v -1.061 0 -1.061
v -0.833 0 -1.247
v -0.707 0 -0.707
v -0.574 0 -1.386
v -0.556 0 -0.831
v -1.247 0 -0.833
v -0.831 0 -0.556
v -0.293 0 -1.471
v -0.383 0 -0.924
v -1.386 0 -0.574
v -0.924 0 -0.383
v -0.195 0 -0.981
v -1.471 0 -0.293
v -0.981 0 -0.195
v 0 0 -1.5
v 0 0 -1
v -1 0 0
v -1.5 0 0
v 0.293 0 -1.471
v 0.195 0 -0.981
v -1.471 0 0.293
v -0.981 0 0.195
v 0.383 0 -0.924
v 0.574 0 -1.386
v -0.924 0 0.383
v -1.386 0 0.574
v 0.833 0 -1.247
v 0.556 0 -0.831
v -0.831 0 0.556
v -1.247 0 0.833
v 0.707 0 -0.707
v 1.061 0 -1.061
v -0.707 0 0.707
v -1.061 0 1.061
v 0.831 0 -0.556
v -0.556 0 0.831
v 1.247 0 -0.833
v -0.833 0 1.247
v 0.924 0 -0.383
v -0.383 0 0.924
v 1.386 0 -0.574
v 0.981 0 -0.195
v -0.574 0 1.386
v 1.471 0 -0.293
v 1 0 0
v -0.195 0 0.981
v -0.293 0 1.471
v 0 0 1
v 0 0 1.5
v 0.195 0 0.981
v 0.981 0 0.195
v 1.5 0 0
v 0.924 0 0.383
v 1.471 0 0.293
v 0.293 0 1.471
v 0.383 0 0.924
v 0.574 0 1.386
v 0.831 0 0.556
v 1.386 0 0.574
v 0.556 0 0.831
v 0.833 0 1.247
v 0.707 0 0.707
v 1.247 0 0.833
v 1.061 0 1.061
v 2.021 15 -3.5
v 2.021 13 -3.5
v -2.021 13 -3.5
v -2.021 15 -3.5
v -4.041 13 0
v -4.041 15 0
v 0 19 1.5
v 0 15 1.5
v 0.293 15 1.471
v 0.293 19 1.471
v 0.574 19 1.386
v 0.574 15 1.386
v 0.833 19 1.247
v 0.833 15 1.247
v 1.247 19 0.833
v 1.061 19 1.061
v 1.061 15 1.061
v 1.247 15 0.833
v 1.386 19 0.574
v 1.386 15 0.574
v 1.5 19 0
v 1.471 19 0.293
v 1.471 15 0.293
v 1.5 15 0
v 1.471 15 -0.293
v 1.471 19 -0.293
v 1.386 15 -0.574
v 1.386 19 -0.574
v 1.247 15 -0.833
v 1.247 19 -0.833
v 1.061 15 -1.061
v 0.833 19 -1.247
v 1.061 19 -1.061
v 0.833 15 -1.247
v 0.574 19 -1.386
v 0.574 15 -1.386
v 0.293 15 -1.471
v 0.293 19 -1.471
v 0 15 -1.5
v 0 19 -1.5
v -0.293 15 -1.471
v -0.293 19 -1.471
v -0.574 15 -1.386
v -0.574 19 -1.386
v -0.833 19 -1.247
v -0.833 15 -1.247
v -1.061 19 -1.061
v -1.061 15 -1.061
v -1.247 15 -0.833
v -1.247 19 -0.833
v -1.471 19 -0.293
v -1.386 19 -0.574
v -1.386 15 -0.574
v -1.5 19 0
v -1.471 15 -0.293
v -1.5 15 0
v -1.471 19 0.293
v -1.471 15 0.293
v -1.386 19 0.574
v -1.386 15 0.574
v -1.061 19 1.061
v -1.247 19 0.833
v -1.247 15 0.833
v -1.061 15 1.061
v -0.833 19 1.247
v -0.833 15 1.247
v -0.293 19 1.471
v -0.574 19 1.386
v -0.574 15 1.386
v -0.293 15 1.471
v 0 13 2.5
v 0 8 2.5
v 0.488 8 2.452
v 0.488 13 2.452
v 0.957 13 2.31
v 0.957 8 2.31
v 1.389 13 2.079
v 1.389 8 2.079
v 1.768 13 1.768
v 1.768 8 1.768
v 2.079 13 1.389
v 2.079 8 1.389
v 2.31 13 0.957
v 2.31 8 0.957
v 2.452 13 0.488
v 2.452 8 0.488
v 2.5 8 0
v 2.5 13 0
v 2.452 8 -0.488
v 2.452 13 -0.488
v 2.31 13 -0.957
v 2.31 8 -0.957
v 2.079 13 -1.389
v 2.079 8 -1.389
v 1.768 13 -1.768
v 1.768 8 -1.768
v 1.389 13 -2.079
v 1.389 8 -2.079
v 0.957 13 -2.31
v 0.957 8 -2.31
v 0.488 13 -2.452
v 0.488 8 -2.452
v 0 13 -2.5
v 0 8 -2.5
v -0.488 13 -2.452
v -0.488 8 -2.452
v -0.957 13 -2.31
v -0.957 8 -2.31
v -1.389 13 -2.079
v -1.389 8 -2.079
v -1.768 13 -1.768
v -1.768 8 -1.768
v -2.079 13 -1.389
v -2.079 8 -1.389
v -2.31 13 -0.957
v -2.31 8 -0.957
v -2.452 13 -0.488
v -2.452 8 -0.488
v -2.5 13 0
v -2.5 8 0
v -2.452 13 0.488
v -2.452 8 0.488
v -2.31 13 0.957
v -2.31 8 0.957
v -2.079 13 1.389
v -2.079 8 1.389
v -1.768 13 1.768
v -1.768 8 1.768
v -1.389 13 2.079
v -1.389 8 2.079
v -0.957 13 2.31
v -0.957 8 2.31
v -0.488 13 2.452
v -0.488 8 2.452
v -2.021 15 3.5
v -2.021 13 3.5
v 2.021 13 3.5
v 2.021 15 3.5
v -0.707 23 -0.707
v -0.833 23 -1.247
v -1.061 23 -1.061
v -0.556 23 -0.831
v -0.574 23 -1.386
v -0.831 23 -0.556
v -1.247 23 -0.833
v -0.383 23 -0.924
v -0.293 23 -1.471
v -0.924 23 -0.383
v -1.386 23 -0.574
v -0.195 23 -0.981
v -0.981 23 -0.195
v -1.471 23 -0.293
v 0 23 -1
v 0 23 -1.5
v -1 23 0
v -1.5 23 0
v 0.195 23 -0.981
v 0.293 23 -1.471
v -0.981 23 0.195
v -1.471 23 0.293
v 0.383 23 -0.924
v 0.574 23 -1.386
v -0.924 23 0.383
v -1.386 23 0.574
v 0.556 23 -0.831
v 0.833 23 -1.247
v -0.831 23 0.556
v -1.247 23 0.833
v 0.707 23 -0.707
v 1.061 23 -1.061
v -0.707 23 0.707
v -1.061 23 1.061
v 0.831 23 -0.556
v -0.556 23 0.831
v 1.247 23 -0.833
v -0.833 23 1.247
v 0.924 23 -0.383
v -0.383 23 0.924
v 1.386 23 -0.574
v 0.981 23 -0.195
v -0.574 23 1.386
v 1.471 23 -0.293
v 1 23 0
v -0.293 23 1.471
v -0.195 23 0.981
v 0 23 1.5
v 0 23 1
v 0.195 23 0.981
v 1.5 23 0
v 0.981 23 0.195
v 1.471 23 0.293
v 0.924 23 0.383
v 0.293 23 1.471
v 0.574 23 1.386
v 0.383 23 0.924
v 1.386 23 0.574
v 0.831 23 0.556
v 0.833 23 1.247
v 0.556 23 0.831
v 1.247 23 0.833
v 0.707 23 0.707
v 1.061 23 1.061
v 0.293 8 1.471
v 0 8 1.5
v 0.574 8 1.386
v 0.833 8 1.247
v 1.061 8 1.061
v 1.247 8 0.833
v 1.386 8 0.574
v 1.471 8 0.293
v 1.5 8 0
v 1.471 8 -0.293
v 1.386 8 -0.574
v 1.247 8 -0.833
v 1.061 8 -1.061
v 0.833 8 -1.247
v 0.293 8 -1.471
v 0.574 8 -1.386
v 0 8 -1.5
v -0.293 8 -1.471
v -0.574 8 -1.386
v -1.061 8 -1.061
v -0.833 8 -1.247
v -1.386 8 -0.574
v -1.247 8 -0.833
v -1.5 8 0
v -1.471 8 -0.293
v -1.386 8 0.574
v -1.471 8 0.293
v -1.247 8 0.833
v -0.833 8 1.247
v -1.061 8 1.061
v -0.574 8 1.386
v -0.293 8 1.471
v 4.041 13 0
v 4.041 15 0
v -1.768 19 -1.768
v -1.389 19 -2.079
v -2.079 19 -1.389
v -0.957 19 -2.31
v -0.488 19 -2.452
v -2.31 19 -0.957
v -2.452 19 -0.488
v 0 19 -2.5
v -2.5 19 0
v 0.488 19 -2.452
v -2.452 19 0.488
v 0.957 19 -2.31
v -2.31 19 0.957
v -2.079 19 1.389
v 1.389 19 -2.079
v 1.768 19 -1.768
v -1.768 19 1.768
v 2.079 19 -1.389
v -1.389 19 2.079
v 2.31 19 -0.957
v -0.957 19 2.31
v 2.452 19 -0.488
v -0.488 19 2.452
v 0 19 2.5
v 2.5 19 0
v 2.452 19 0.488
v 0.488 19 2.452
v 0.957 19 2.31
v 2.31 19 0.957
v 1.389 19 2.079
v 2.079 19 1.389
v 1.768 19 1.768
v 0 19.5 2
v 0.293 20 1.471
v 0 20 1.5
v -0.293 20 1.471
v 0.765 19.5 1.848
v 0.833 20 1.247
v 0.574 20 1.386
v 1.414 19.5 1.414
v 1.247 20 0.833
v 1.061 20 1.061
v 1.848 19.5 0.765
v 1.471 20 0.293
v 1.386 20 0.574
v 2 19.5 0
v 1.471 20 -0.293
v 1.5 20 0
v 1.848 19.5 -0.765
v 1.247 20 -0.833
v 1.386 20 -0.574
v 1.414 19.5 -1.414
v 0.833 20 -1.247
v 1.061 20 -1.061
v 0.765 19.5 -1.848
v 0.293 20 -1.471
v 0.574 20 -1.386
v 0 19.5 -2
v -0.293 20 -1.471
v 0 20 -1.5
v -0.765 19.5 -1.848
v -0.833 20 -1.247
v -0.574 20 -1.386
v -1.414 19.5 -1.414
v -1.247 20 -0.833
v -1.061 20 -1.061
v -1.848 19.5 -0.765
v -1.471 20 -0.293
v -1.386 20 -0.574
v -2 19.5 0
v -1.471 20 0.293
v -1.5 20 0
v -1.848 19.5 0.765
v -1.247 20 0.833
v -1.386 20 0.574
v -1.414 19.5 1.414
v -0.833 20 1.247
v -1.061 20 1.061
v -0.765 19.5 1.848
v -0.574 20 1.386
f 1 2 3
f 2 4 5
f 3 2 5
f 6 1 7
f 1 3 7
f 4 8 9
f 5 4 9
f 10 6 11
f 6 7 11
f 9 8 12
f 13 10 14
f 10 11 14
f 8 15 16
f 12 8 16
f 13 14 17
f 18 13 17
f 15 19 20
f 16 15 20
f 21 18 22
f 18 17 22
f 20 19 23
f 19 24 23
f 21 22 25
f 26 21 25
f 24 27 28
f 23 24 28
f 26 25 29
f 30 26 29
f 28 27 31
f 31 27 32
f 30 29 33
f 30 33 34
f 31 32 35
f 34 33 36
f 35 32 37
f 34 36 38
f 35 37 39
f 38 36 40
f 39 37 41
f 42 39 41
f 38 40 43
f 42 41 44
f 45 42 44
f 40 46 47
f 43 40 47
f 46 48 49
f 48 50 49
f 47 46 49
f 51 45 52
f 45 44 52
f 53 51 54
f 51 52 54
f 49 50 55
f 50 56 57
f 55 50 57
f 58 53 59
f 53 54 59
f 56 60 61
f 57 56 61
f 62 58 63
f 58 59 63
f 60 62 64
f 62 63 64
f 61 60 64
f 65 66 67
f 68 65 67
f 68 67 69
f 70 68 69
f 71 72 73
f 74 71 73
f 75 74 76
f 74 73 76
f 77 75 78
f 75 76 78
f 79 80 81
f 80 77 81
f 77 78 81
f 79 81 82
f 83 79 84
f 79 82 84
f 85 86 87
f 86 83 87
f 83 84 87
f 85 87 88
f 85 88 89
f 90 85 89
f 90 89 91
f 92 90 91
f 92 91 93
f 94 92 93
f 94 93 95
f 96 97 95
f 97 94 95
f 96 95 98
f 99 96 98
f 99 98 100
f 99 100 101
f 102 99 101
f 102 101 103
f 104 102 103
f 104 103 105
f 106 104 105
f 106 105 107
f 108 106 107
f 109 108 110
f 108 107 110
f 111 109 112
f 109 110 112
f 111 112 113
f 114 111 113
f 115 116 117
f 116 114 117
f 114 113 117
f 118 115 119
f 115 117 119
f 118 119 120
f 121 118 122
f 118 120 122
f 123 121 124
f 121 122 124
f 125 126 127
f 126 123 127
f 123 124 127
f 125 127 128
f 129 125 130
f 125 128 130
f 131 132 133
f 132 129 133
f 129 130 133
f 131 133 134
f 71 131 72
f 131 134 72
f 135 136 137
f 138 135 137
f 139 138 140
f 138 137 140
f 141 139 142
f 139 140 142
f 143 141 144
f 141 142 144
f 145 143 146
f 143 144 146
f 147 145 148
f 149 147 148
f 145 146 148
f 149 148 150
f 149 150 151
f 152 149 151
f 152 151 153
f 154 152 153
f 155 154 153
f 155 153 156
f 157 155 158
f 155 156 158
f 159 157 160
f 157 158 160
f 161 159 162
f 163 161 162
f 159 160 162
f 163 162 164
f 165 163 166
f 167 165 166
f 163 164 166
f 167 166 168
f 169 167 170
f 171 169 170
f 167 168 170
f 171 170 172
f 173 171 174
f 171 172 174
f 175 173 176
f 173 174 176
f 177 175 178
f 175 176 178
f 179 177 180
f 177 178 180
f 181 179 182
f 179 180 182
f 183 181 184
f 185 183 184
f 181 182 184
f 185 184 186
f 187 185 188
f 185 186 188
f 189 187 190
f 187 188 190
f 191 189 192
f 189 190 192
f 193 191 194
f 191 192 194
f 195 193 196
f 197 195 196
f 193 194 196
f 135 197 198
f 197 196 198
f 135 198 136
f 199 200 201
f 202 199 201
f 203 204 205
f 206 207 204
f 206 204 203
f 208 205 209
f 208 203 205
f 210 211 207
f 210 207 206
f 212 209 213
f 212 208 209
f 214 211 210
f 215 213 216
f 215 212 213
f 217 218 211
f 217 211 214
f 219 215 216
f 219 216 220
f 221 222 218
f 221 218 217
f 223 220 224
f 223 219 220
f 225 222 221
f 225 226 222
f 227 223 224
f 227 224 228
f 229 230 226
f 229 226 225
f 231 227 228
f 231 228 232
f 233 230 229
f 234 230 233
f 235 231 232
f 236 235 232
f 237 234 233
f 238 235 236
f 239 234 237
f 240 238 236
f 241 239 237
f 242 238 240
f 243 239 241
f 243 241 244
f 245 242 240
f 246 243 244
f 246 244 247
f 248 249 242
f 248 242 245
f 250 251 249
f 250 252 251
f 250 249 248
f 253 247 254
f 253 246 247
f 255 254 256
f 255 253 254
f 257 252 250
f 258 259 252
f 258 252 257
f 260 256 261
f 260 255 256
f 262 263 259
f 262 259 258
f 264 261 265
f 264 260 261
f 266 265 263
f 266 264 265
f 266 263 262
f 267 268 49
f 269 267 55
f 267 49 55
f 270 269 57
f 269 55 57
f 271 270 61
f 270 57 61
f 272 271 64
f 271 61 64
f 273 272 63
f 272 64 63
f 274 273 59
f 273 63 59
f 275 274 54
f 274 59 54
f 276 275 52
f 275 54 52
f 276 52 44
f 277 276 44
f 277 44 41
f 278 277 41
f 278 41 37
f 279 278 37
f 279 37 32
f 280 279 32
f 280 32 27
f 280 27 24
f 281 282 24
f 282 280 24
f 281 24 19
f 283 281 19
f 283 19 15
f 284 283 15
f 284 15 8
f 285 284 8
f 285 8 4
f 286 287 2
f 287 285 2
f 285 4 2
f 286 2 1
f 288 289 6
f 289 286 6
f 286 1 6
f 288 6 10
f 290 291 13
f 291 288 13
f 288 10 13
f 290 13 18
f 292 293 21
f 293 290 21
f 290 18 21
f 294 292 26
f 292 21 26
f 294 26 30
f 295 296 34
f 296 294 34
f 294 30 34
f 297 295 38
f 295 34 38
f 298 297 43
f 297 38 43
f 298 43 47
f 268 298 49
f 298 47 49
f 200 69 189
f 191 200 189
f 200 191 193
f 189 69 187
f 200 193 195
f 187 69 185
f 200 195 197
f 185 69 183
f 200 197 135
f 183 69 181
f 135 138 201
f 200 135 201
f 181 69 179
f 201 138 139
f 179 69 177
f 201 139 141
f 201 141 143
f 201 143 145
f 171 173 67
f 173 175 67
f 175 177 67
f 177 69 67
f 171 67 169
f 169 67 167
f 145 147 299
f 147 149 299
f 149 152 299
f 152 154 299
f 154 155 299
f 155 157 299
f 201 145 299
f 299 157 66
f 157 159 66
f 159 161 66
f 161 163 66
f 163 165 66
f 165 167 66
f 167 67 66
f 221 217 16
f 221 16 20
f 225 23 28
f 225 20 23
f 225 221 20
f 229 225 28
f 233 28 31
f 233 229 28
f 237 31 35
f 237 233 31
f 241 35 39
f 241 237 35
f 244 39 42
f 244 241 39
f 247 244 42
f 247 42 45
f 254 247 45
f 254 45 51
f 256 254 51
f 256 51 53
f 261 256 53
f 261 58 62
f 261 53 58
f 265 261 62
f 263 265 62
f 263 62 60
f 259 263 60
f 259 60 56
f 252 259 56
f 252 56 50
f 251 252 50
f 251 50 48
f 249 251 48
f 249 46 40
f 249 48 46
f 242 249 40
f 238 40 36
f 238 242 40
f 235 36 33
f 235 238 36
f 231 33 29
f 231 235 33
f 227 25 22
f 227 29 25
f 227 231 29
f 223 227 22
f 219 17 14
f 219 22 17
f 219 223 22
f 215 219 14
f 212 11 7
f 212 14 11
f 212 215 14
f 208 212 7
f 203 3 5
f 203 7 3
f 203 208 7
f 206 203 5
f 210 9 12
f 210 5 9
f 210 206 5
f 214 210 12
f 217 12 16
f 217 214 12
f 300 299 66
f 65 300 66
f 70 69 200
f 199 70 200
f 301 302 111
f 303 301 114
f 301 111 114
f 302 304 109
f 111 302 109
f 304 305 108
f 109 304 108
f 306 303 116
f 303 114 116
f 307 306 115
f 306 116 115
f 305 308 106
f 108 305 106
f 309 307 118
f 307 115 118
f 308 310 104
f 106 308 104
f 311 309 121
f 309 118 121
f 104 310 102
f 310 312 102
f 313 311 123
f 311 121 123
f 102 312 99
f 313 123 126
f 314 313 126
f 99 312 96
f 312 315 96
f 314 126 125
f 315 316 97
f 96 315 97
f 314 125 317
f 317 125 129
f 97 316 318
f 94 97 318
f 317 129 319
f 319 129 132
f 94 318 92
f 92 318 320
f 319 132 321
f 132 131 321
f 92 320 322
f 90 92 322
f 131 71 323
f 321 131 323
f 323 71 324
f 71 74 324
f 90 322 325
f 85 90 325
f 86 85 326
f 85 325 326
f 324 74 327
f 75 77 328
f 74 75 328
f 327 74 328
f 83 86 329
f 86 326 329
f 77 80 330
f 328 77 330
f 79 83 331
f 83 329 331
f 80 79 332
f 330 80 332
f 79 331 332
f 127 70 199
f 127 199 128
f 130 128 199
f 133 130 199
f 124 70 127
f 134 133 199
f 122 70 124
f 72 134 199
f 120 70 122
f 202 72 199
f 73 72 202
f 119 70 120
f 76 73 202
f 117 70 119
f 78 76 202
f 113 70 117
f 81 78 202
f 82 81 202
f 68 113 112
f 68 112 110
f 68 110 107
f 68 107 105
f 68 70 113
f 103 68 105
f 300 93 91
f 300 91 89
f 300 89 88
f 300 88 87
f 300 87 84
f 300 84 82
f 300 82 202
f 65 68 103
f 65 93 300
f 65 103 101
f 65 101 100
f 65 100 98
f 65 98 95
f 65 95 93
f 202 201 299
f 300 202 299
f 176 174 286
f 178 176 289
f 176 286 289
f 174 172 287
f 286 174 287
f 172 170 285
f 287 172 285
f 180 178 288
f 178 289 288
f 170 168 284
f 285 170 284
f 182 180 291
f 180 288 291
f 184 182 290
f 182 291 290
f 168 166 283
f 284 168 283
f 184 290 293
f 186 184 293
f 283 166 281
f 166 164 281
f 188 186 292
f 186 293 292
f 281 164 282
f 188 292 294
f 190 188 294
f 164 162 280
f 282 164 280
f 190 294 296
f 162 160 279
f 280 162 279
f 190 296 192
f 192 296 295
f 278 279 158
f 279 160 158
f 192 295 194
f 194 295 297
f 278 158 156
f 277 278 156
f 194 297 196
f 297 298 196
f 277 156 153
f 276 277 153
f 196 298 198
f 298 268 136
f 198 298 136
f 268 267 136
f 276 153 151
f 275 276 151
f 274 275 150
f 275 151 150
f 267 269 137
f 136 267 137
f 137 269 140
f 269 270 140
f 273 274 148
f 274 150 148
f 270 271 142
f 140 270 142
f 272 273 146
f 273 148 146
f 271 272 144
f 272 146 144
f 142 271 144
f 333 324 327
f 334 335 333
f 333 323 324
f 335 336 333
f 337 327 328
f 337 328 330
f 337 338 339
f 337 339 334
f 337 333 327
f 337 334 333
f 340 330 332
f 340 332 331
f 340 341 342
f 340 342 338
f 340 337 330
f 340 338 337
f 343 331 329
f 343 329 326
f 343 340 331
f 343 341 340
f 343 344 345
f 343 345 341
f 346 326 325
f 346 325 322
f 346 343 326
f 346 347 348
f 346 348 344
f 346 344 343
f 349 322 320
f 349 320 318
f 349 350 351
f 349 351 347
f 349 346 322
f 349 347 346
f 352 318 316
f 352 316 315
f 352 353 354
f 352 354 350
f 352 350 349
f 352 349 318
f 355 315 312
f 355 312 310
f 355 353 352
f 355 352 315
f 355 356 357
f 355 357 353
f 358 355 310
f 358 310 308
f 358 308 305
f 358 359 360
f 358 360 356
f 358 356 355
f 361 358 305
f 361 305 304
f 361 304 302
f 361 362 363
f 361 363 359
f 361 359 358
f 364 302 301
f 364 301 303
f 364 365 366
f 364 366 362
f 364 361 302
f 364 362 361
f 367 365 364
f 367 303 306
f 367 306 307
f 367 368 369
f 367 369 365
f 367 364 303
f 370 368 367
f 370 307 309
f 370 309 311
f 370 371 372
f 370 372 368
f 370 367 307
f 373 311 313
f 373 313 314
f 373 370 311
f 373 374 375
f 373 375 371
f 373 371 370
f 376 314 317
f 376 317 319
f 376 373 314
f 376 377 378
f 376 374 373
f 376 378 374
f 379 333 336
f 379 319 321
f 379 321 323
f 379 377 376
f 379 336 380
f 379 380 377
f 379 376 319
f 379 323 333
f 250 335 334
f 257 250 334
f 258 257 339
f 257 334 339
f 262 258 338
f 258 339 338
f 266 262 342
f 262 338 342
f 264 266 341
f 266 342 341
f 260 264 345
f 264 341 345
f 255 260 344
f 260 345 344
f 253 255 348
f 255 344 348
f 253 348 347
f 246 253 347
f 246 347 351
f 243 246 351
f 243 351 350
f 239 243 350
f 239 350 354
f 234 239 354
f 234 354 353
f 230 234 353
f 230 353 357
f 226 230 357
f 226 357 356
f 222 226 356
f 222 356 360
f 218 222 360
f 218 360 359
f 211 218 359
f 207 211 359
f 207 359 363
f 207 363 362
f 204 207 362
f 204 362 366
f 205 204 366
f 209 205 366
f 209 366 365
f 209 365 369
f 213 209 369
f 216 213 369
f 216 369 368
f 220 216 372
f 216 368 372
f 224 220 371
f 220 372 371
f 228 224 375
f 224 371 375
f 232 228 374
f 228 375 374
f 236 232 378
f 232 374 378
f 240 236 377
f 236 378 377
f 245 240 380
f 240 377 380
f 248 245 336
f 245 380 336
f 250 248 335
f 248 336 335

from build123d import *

# Parameters (mm, degrees)
SKETCH1_R               = 1.5
BOSS_EXTRUDE1_DEPTH     = 23
BOSS_EXTRUDE2_START     = 8
SKETCH2_R               = 2.5
BOSS_EXTRUDE2_DEPTH     = 5
BOSS_EXTRUDE3_DEPTH     = 2
BOSS_EXTRUDE4_START     = 4
SKETCH5_R               = 2.5
BOSS_EXTRUDE4_DEPTH     = 1
BOSS_EXTRUDE4_TAPER     = 45
CUT_EXTRUDE1_DEPTH      = 24.613202522
CUT_EXTRUDE1_DEPTH_BACK = 24.613202522
SKETCH6_R               = 1


with BuildPart() as part:
    # Sketch1 → Boss-Extrude1 (new body)
    with BuildSketch(Plane(origin=(0, 0, 0), x_dir=(1, 0, 0), z_dir=(0, 1, 0))):
        with Locations(Location((0, 0, 0), (0, 0, 270))):
            Circle(SKETCH1_R)
    extrude(amount=BOSS_EXTRUDE1_DEPTH)

    # Sketch2 → Boss-Extrude2 (add)
    with BuildSketch(Plane(origin=(0, 0, 0), x_dir=(1, 0, 0), z_dir=(0, 1, 0)).offset(BOSS_EXTRUDE2_START)):
        with Locations(Location((0, 0, 0), (0, 0, 270))):
            Circle(SKETCH2_R)
    extrude(amount=BOSS_EXTRUDE2_DEPTH)

    # Sketch3 → Boss-Extrude3 (add)
    with BuildSketch(Plane(origin=(0, 13, 0), x_dir=(1, 0, 0), z_dir=(0, 1, 0))):
        Polygon((-2.020725942, 3.5), (-4.041451884, 0), (-2.020725942, -3.5), (2.020725942, -3.5), (4.041451884, 0), (2.020725942, 3.5), align=None)
    extrude(amount=BOSS_EXTRUDE3_DEPTH)

    # Sketch5 → Boss-Extrude4 (add)
    with BuildSketch(Plane(origin=(0, 15, 0), x_dir=(1, 0, 0), z_dir=(0, 1, 0)).offset(BOSS_EXTRUDE4_START)):
        with Locations(Location((0, 0, 0), (0, 0, 270))):
            Circle(SKETCH5_R)
    extrude(amount=BOSS_EXTRUDE4_DEPTH, taper=BOSS_EXTRUDE4_TAPER)

    # Sketch6 → Cut-Extrude1 (cut, two sides: drawn at the far end of the back side and taken through both)
    with BuildSketch(Plane.XZ.offset(-CUT_EXTRUDE1_DEPTH_BACK)):
        with Locations(Location((0, 0, 0), (0, 0, 270))):
            Circle(SKETCH6_R)
    extrude(amount=CUT_EXTRUDE1_DEPTH + CUT_EXTRUDE1_DEPTH_BACK, mode=Mode.SUBTRACT)


solid = part.part
